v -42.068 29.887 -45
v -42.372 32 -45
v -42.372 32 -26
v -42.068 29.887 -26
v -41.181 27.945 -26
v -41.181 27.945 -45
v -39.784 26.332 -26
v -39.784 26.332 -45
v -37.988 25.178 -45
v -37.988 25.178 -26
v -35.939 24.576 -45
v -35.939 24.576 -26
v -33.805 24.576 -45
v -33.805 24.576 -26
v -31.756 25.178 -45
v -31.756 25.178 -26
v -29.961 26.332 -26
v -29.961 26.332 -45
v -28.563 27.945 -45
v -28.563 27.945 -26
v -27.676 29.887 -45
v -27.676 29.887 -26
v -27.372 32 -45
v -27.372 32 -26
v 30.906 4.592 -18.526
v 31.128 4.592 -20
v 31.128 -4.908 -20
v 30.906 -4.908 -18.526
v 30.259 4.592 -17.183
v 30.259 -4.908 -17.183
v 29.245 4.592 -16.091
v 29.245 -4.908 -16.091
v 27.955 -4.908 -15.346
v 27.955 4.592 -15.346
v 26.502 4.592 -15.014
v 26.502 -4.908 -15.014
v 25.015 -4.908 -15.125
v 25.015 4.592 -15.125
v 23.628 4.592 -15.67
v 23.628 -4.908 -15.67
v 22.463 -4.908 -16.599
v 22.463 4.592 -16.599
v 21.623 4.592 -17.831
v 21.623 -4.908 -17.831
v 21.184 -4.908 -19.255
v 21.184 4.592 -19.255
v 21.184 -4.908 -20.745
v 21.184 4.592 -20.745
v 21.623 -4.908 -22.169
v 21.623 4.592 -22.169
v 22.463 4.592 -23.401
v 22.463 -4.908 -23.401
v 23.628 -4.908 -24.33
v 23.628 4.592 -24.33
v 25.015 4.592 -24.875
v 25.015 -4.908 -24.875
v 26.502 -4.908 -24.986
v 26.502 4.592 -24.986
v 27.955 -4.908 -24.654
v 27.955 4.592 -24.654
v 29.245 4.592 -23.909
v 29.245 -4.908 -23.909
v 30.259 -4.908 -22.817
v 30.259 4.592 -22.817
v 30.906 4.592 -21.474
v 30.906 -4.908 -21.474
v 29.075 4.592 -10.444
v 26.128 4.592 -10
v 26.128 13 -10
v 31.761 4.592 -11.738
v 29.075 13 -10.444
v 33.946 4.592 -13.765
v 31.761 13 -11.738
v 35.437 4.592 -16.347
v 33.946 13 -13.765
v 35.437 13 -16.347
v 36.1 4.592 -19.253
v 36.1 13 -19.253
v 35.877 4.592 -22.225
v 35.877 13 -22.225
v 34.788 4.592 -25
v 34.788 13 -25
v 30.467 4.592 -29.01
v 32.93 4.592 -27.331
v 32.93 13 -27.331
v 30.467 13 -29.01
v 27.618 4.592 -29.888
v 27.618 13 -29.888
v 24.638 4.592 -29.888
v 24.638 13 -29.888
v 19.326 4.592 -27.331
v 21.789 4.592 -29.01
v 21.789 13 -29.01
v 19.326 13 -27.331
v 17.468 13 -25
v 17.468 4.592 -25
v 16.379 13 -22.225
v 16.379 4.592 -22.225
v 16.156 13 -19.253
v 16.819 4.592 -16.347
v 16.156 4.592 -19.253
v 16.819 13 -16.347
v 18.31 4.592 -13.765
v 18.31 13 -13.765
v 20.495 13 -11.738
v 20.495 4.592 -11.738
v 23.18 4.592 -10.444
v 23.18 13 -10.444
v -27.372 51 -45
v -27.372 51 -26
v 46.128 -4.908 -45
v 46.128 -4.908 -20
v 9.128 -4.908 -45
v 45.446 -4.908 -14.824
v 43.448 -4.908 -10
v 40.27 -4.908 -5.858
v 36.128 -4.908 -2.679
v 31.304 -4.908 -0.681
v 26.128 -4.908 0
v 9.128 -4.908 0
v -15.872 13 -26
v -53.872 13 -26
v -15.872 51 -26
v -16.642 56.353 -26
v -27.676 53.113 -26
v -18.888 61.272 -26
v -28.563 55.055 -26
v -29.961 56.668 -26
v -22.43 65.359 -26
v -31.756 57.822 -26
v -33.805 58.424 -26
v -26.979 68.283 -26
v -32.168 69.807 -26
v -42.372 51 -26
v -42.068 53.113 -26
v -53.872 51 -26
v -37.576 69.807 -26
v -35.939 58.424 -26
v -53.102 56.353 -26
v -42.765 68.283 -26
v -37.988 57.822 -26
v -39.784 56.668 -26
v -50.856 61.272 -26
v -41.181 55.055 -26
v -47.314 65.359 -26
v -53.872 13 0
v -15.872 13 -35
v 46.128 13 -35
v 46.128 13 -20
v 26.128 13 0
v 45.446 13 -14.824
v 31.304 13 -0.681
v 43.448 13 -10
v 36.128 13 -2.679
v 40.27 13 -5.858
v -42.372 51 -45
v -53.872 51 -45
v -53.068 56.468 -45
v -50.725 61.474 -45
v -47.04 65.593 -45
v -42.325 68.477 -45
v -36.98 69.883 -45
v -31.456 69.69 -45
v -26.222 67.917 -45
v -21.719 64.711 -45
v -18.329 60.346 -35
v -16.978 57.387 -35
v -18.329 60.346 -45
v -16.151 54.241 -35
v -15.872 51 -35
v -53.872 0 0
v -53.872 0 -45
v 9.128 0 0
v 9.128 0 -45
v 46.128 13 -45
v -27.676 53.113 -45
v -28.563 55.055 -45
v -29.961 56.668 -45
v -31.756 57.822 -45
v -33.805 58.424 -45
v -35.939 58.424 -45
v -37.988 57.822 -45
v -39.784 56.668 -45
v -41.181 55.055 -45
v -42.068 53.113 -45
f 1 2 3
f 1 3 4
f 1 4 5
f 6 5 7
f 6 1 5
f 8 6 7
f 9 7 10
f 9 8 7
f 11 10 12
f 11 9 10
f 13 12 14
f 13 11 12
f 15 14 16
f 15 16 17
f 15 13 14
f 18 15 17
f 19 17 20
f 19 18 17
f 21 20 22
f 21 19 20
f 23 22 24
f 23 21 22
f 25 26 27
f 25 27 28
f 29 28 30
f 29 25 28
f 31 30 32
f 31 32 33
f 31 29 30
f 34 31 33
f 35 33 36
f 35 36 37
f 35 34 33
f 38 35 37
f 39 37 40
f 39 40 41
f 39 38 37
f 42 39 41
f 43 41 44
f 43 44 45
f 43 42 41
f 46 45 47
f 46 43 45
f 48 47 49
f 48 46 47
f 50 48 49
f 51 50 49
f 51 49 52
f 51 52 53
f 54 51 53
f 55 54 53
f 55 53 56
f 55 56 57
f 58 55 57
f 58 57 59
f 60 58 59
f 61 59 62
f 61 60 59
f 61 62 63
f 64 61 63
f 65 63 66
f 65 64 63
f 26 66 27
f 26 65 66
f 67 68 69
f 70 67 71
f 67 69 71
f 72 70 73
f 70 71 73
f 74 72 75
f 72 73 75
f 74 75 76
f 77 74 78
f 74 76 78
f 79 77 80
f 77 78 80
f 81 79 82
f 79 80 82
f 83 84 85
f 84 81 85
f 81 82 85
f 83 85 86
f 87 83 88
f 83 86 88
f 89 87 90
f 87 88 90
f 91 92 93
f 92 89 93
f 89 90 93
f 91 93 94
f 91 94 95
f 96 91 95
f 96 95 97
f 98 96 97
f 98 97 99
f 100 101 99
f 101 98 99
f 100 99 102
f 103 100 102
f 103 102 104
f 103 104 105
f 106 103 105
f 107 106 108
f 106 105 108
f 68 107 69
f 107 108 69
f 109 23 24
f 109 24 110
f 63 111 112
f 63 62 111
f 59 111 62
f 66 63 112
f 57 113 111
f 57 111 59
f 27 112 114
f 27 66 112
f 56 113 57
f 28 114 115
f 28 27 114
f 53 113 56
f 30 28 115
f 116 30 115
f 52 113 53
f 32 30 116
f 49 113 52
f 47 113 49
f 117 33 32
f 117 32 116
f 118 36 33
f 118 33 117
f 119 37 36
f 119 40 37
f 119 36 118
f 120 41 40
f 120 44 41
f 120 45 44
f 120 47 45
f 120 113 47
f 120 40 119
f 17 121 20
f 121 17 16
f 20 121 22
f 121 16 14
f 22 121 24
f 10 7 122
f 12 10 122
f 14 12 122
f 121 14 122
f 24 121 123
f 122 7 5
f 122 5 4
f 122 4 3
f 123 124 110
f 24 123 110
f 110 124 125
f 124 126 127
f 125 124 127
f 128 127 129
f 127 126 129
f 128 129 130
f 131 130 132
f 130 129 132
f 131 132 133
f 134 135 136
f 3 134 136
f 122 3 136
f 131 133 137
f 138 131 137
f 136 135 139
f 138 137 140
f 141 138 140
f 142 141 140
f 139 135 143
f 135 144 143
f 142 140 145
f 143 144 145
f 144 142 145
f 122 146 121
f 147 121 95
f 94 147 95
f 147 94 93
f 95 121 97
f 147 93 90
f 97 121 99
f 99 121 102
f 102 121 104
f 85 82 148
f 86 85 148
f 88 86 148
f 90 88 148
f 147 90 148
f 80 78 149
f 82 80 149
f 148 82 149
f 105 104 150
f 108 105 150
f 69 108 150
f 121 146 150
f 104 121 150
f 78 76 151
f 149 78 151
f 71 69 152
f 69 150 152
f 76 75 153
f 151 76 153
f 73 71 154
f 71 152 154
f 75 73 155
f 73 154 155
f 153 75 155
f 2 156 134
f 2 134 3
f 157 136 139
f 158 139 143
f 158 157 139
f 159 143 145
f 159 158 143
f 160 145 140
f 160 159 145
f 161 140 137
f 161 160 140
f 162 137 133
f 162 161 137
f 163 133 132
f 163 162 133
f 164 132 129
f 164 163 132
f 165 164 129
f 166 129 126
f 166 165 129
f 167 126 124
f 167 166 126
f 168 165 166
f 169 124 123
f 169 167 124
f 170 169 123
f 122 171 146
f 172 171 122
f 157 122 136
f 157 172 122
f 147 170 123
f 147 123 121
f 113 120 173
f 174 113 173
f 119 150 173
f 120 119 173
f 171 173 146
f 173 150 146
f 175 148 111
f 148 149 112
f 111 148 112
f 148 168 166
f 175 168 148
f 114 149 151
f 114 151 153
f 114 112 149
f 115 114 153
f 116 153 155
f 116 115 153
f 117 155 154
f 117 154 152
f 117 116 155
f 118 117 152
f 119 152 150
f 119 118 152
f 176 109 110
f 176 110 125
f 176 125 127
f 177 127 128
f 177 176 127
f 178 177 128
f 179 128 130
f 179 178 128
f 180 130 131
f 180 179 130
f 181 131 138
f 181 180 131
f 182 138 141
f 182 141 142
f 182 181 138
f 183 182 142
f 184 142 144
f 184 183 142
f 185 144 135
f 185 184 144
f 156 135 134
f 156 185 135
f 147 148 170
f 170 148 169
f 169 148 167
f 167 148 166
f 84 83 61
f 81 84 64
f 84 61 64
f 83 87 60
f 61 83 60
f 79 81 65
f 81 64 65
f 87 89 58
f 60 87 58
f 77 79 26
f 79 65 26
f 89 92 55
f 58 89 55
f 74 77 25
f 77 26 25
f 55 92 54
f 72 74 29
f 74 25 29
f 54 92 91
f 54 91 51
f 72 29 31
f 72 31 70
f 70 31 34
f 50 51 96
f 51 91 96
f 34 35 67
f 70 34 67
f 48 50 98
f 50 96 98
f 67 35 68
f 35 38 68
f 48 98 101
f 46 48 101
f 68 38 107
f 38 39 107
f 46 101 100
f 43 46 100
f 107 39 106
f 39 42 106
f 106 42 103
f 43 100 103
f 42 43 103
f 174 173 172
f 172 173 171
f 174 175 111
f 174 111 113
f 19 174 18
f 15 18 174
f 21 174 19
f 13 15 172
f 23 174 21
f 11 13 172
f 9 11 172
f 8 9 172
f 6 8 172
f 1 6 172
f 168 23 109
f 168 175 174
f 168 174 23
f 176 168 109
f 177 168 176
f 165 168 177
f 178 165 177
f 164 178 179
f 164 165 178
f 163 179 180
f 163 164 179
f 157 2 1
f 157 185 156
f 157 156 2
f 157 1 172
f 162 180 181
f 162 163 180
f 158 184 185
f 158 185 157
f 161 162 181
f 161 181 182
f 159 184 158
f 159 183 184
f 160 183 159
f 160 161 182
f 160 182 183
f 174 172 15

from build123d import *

# Parameters (mm, degrees)
BOSS_EXTRUDE1_DEPTH = 45
FILLET1_R           = 20
BOSS_EXTRUDE2_DEPTH = 19
BOSS_EXTRUDE3_DEPTH = 10
CUT_EXTRUDE2_REACH  = 92.422
SKETCH4_R           = 10
SKETCH4_R_2         = 5
SKETCH4_R_3         = 3
BOSS_EXTRUDE4_START = -9.5
SKETCH7_R           = 10
SKETCH7_R_2         = 5
BOSS_EXTRUDE4_DEPTH = 9.5


with BuildPart() as part:
    # Sketch1 → Boss-Extrude1 (new body)
    with BuildSketch(Plane.XY):
        Polygon((-53.872058339, 0), (-53.872058339, 13), (46.127941661, 13), (46.127941661, -4.908485857), (9.127941661, -4.908485857), (9.127941661, 0), align=None)
    extrude(amount=-BOSS_EXTRUDE1_DEPTH)

    # Fillet1
    fillet1_edges = [part.edges().sort_by_distance(p)[0] for p in [
        (46.127941661, 4.045757072, 0),
    ]]
    fillet(fillet1_edges, radius=FILLET1_R)

    # Sketch2 → Boss-Extrude2 (add)
    with BuildSketch(Plane(origin=(0, 0, -45), x_dir=(-1, 0, 0), z_dir=(0, 0, -1))):
        with BuildLine():
            Line((53.872058339, 13), (53.872058339, 51))
            ThreePointArc((53.872058339, 51), (34.872058339, 70), (15.872058339, 51))
            Line((15.872058339, 51), (15.872058339, 13))
            Line((15.872058339, 13), (53.872058339, 13))
        make_face()
        with BuildLine():
            Line((42.372058339, 51), (42.372058339, 32))
            ThreePointArc((42.372058339, 32), (34.872058339, 24.5), (27.372058339, 32))
            Line((27.372058339, 32), (27.372058339, 51))
            ThreePointArc((27.372058339, 51), (34.872058339, 58.5), (42.372058339, 51))
        make_face(mode=Mode.SUBTRACT)
    extrude(amount=-BOSS_EXTRUDE2_DEPTH)

    # Sketch3 → Boss-Extrude3 (add)
    with BuildSketch(Plane(origin=(0, 0, -45), x_dir=(-1, 0, 0), z_dir=(0, 0, -1))):
        Polygon((-46.127941661, 13), (16.803506509, 13), (18.329411345, 13), (18.329411345, 60.345631624), align=None)
    extrude(amount=-BOSS_EXTRUDE3_DEPTH)

    # Sketch4 → Cut-Extrude2 (cut, up to next)
    with BuildSketch(Plane(origin=(0, 13, 0), x_dir=(1, 0, 0), z_dir=(0, 1, 0)), mode=Mode.PRIVATE) as cut_extrude2_sk1:
        with Locations(Location((26.127941661, 20, 0), (0, 0, 270))):
            Circle(SKETCH4_R)
        with Locations((26.127941661, 20)):
            Circle(SKETCH4_R_2, mode=Mode.SUBTRACT)
    cut_extrude2_tool1 = extrude(cut_extrude2_sk1.sketch, amount=-CUT_EXTRUDE2_REACH, mode=Mode.PRIVATE) & part.part
    # Sketch4 → Cut-Extrude2 (cut, up to next)
    with BuildSketch(Plane(origin=(0, 13, 0), x_dir=(1, 0, 0), z_dir=(0, 1, 0)), mode=Mode.PRIVATE) as cut_extrude2_sk2:
        with Locations((26.127941661, 20)):
            Circle(SKETCH4_R_2)
        with Locations((26.127941661, 20)):
            Circle(SKETCH4_R_3, mode=Mode.SUBTRACT)
    cut_extrude2_tool2 = extrude(cut_extrude2_sk2.sketch, amount=-CUT_EXTRUDE2_REACH, mode=Mode.PRIVATE) & part.part
    # Sketch4 → Cut-Extrude2 (cut, up to next)
    with BuildSketch(Plane(origin=(0, 13, 0), x_dir=(1, 0, 0), z_dir=(0, 1, 0)), mode=Mode.PRIVATE) as cut_extrude2_sk3:
        with Locations((26.127941661, 20)):
            Circle(SKETCH4_R_3)
    cut_extrude2_tool3 = extrude(cut_extrude2_sk3.sketch, amount=-CUT_EXTRUDE2_REACH, mode=Mode.PRIVATE) & part.part
    add(cut_extrude2_tool1.solids().sort_by_distance((26.127942, 13, -29.717157))[0], mode=Mode.SUBTRACT)
    add(cut_extrude2_tool2.solids().sort_by_distance((21.269363, 13, -20))[0], mode=Mode.SUBTRACT)
    add(cut_extrude2_tool3.solids().sort_by_distance((26.127942, 13, -20))[0], mode=Mode.SUBTRACT)

    # Sketch7 → Boss-Extrude4 (add)
    with BuildSketch(Plane.XZ.offset(4.908485857).offset(BOSS_EXTRUDE4_START)):
        with Locations(Location((26.127941661, -20, 0), (0, 0, 90))):
            Circle(SKETCH7_R)
        with Locations((26.127941661, -20)):
            Circle(SKETCH7_R_2, mode=Mode.SUBTRACT)
    extrude(amount=BOSS_EXTRUDE4_DEPTH)


solid = part.part
